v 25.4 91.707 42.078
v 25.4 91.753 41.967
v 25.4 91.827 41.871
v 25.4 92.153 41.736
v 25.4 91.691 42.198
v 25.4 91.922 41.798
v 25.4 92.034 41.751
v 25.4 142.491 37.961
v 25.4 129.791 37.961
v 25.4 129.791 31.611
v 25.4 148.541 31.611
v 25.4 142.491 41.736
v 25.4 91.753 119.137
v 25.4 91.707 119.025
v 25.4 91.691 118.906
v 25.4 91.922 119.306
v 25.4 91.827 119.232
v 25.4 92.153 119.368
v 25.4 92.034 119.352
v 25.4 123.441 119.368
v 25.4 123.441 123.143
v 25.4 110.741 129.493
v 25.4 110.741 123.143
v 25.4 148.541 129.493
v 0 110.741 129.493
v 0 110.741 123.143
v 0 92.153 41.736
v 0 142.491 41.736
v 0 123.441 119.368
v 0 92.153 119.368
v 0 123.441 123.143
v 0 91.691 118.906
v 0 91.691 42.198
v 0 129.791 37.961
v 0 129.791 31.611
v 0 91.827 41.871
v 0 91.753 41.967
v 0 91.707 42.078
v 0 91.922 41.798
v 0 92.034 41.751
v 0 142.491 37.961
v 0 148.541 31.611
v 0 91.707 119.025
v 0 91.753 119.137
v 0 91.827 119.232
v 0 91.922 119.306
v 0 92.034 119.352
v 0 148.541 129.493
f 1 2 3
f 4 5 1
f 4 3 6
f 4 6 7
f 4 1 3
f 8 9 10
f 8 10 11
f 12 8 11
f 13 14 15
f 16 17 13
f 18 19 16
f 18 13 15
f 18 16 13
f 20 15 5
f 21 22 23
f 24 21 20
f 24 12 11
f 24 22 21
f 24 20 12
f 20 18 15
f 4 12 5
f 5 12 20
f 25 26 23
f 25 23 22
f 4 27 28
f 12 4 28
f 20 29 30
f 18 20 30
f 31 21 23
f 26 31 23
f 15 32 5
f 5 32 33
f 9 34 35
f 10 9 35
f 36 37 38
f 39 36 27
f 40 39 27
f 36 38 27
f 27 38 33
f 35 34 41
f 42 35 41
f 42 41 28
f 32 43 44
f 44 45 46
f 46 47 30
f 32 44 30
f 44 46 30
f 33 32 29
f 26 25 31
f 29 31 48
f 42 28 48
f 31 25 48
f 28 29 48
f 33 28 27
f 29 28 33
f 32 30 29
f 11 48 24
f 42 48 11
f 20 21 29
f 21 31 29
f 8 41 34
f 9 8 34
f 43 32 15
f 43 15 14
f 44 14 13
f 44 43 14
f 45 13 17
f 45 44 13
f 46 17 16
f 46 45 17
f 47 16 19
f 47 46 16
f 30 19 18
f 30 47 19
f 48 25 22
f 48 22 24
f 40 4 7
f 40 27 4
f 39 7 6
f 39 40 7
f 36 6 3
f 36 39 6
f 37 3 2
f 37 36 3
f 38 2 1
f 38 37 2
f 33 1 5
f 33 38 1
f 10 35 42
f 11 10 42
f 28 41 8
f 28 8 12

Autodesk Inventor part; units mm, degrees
ref_plane "YZ Plane" through (0, 0, 0) normal (1, 0, 0) x (0, 1, 0)
ref_plane "XZ Plane" through (0, 0, 0) normal (0, 1, 0) x (-1, 0, 0)
ref_plane "XY Plane" through (0, 0, 0) normal (0, 0, 1) x (1, 0, 0)
sketch "Sketch1" plane through (0, 0, 0) normal (1, 0, 0) x (0, 1, 0)
  line L0 (92.1534, 119.6677) -> (119.9664, 119.6677) construction
  arc A0 (92.1534, 119.6677) -> (91.3914, 118.9057) centre (92.1534, 118.9057) ccw construction
  line L1 (91.3914, 118.9057) -> (91.3914, 42.1977) construction
  arc A1 (91.3914, 42.1977) -> (92.1534, 41.4357) centre (92.1534, 42.1977) ccw construction
  line L2 (139.0164, 41.4357) -> (92.1534, 41.4357) construction
  line L3 (148.5414, 119.3677) -> (92.1534, 119.3677)
  arc A2 (92.1534, 119.3677) -> (91.6914, 118.9057) centre (92.1534, 118.9057) ccw
  line L4 (91.6914, 118.9057) -> (91.6914, 42.1977)
  arc A3 (91.6914, 42.1977) -> (92.1534, 41.7357) centre (92.1534, 42.1977) ccw
  line L5 (92.1534, 41.7357) -> (148.5414, 41.7357)
  line L6 (148.5414, 119.3677) -> (148.5414, 41.7357)
  line L7 (142.1914, 41.4357) -> (142.1914, 38.2607) construction
  line L8 (123.1414, 122.8427) -> (123.1414, 119.6677) construction
  line L9 (119.9664, 122.8427) -> (123.1414, 122.8427) construction
  line L10 (142.1914, 38.2607) -> (139.0164, 38.2607) construction
  line L11 (123.4414, 119.3677) -> (148.5414, 119.3677)
  line L12 (148.5414, 119.3677) -> (148.5414, 123.1427)
  line L13 (148.5414, 123.1427) -> (123.4414, 123.1427)
  line L14 (123.4414, 123.1427) -> (123.4414, 119.3677)
  line L15 (148.5414, 123.1427) -> (110.7414, 123.1427)
  line L16 (110.7414, 123.1427) -> (110.7414, 129.4927)
  line L17 (110.7414, 129.4927) -> (148.5414, 129.4927)
  line L18 (148.5414, 129.4927) -> (148.5414, 123.1427)
  line L19 (142.4914, 41.7357) -> (148.5414, 41.7357)
  line L20 (148.5414, 41.7357) -> (148.5414, 37.9607)
  line L21 (148.5414, 37.9607) -> (142.4914, 37.9607)
  line L22 (142.4914, 37.9607) -> (142.4914, 41.7357)
  line L23 (148.5414, 37.9607) -> (129.7914, 37.9607)
  line L24 (129.7914, 37.9607) -> (129.7914, 31.6107)
  line L25 (129.7914, 31.6107) -> (148.5414, 31.6107)
  line L26 (148.5414, 31.6107) -> (148.5414, 37.9607)
  point P0 (0, 0)
  dimension "d0" = 0.3
  dimension "d1" = 6.35
  dimension "d2" = 0.3
  dimension "d3" = 0.3
  dimension "d4" = 0.3
  dimension "d5" = 0.3
  dimension "d6" = 6.35
  dimension "d7" = 6.35
  dimension "d8" = 12.7
  dimension "d9" = 12.7
extrude "Extrusion1" add sketch "Sketch1" along normal blind 25.4
equation "\"d2\" = d0"
equation "\"d3\" = d0"
equation "\"d4\" = d0"
equation "\"d5\" = d0"
properties part number "BumperFrameStandoff"
